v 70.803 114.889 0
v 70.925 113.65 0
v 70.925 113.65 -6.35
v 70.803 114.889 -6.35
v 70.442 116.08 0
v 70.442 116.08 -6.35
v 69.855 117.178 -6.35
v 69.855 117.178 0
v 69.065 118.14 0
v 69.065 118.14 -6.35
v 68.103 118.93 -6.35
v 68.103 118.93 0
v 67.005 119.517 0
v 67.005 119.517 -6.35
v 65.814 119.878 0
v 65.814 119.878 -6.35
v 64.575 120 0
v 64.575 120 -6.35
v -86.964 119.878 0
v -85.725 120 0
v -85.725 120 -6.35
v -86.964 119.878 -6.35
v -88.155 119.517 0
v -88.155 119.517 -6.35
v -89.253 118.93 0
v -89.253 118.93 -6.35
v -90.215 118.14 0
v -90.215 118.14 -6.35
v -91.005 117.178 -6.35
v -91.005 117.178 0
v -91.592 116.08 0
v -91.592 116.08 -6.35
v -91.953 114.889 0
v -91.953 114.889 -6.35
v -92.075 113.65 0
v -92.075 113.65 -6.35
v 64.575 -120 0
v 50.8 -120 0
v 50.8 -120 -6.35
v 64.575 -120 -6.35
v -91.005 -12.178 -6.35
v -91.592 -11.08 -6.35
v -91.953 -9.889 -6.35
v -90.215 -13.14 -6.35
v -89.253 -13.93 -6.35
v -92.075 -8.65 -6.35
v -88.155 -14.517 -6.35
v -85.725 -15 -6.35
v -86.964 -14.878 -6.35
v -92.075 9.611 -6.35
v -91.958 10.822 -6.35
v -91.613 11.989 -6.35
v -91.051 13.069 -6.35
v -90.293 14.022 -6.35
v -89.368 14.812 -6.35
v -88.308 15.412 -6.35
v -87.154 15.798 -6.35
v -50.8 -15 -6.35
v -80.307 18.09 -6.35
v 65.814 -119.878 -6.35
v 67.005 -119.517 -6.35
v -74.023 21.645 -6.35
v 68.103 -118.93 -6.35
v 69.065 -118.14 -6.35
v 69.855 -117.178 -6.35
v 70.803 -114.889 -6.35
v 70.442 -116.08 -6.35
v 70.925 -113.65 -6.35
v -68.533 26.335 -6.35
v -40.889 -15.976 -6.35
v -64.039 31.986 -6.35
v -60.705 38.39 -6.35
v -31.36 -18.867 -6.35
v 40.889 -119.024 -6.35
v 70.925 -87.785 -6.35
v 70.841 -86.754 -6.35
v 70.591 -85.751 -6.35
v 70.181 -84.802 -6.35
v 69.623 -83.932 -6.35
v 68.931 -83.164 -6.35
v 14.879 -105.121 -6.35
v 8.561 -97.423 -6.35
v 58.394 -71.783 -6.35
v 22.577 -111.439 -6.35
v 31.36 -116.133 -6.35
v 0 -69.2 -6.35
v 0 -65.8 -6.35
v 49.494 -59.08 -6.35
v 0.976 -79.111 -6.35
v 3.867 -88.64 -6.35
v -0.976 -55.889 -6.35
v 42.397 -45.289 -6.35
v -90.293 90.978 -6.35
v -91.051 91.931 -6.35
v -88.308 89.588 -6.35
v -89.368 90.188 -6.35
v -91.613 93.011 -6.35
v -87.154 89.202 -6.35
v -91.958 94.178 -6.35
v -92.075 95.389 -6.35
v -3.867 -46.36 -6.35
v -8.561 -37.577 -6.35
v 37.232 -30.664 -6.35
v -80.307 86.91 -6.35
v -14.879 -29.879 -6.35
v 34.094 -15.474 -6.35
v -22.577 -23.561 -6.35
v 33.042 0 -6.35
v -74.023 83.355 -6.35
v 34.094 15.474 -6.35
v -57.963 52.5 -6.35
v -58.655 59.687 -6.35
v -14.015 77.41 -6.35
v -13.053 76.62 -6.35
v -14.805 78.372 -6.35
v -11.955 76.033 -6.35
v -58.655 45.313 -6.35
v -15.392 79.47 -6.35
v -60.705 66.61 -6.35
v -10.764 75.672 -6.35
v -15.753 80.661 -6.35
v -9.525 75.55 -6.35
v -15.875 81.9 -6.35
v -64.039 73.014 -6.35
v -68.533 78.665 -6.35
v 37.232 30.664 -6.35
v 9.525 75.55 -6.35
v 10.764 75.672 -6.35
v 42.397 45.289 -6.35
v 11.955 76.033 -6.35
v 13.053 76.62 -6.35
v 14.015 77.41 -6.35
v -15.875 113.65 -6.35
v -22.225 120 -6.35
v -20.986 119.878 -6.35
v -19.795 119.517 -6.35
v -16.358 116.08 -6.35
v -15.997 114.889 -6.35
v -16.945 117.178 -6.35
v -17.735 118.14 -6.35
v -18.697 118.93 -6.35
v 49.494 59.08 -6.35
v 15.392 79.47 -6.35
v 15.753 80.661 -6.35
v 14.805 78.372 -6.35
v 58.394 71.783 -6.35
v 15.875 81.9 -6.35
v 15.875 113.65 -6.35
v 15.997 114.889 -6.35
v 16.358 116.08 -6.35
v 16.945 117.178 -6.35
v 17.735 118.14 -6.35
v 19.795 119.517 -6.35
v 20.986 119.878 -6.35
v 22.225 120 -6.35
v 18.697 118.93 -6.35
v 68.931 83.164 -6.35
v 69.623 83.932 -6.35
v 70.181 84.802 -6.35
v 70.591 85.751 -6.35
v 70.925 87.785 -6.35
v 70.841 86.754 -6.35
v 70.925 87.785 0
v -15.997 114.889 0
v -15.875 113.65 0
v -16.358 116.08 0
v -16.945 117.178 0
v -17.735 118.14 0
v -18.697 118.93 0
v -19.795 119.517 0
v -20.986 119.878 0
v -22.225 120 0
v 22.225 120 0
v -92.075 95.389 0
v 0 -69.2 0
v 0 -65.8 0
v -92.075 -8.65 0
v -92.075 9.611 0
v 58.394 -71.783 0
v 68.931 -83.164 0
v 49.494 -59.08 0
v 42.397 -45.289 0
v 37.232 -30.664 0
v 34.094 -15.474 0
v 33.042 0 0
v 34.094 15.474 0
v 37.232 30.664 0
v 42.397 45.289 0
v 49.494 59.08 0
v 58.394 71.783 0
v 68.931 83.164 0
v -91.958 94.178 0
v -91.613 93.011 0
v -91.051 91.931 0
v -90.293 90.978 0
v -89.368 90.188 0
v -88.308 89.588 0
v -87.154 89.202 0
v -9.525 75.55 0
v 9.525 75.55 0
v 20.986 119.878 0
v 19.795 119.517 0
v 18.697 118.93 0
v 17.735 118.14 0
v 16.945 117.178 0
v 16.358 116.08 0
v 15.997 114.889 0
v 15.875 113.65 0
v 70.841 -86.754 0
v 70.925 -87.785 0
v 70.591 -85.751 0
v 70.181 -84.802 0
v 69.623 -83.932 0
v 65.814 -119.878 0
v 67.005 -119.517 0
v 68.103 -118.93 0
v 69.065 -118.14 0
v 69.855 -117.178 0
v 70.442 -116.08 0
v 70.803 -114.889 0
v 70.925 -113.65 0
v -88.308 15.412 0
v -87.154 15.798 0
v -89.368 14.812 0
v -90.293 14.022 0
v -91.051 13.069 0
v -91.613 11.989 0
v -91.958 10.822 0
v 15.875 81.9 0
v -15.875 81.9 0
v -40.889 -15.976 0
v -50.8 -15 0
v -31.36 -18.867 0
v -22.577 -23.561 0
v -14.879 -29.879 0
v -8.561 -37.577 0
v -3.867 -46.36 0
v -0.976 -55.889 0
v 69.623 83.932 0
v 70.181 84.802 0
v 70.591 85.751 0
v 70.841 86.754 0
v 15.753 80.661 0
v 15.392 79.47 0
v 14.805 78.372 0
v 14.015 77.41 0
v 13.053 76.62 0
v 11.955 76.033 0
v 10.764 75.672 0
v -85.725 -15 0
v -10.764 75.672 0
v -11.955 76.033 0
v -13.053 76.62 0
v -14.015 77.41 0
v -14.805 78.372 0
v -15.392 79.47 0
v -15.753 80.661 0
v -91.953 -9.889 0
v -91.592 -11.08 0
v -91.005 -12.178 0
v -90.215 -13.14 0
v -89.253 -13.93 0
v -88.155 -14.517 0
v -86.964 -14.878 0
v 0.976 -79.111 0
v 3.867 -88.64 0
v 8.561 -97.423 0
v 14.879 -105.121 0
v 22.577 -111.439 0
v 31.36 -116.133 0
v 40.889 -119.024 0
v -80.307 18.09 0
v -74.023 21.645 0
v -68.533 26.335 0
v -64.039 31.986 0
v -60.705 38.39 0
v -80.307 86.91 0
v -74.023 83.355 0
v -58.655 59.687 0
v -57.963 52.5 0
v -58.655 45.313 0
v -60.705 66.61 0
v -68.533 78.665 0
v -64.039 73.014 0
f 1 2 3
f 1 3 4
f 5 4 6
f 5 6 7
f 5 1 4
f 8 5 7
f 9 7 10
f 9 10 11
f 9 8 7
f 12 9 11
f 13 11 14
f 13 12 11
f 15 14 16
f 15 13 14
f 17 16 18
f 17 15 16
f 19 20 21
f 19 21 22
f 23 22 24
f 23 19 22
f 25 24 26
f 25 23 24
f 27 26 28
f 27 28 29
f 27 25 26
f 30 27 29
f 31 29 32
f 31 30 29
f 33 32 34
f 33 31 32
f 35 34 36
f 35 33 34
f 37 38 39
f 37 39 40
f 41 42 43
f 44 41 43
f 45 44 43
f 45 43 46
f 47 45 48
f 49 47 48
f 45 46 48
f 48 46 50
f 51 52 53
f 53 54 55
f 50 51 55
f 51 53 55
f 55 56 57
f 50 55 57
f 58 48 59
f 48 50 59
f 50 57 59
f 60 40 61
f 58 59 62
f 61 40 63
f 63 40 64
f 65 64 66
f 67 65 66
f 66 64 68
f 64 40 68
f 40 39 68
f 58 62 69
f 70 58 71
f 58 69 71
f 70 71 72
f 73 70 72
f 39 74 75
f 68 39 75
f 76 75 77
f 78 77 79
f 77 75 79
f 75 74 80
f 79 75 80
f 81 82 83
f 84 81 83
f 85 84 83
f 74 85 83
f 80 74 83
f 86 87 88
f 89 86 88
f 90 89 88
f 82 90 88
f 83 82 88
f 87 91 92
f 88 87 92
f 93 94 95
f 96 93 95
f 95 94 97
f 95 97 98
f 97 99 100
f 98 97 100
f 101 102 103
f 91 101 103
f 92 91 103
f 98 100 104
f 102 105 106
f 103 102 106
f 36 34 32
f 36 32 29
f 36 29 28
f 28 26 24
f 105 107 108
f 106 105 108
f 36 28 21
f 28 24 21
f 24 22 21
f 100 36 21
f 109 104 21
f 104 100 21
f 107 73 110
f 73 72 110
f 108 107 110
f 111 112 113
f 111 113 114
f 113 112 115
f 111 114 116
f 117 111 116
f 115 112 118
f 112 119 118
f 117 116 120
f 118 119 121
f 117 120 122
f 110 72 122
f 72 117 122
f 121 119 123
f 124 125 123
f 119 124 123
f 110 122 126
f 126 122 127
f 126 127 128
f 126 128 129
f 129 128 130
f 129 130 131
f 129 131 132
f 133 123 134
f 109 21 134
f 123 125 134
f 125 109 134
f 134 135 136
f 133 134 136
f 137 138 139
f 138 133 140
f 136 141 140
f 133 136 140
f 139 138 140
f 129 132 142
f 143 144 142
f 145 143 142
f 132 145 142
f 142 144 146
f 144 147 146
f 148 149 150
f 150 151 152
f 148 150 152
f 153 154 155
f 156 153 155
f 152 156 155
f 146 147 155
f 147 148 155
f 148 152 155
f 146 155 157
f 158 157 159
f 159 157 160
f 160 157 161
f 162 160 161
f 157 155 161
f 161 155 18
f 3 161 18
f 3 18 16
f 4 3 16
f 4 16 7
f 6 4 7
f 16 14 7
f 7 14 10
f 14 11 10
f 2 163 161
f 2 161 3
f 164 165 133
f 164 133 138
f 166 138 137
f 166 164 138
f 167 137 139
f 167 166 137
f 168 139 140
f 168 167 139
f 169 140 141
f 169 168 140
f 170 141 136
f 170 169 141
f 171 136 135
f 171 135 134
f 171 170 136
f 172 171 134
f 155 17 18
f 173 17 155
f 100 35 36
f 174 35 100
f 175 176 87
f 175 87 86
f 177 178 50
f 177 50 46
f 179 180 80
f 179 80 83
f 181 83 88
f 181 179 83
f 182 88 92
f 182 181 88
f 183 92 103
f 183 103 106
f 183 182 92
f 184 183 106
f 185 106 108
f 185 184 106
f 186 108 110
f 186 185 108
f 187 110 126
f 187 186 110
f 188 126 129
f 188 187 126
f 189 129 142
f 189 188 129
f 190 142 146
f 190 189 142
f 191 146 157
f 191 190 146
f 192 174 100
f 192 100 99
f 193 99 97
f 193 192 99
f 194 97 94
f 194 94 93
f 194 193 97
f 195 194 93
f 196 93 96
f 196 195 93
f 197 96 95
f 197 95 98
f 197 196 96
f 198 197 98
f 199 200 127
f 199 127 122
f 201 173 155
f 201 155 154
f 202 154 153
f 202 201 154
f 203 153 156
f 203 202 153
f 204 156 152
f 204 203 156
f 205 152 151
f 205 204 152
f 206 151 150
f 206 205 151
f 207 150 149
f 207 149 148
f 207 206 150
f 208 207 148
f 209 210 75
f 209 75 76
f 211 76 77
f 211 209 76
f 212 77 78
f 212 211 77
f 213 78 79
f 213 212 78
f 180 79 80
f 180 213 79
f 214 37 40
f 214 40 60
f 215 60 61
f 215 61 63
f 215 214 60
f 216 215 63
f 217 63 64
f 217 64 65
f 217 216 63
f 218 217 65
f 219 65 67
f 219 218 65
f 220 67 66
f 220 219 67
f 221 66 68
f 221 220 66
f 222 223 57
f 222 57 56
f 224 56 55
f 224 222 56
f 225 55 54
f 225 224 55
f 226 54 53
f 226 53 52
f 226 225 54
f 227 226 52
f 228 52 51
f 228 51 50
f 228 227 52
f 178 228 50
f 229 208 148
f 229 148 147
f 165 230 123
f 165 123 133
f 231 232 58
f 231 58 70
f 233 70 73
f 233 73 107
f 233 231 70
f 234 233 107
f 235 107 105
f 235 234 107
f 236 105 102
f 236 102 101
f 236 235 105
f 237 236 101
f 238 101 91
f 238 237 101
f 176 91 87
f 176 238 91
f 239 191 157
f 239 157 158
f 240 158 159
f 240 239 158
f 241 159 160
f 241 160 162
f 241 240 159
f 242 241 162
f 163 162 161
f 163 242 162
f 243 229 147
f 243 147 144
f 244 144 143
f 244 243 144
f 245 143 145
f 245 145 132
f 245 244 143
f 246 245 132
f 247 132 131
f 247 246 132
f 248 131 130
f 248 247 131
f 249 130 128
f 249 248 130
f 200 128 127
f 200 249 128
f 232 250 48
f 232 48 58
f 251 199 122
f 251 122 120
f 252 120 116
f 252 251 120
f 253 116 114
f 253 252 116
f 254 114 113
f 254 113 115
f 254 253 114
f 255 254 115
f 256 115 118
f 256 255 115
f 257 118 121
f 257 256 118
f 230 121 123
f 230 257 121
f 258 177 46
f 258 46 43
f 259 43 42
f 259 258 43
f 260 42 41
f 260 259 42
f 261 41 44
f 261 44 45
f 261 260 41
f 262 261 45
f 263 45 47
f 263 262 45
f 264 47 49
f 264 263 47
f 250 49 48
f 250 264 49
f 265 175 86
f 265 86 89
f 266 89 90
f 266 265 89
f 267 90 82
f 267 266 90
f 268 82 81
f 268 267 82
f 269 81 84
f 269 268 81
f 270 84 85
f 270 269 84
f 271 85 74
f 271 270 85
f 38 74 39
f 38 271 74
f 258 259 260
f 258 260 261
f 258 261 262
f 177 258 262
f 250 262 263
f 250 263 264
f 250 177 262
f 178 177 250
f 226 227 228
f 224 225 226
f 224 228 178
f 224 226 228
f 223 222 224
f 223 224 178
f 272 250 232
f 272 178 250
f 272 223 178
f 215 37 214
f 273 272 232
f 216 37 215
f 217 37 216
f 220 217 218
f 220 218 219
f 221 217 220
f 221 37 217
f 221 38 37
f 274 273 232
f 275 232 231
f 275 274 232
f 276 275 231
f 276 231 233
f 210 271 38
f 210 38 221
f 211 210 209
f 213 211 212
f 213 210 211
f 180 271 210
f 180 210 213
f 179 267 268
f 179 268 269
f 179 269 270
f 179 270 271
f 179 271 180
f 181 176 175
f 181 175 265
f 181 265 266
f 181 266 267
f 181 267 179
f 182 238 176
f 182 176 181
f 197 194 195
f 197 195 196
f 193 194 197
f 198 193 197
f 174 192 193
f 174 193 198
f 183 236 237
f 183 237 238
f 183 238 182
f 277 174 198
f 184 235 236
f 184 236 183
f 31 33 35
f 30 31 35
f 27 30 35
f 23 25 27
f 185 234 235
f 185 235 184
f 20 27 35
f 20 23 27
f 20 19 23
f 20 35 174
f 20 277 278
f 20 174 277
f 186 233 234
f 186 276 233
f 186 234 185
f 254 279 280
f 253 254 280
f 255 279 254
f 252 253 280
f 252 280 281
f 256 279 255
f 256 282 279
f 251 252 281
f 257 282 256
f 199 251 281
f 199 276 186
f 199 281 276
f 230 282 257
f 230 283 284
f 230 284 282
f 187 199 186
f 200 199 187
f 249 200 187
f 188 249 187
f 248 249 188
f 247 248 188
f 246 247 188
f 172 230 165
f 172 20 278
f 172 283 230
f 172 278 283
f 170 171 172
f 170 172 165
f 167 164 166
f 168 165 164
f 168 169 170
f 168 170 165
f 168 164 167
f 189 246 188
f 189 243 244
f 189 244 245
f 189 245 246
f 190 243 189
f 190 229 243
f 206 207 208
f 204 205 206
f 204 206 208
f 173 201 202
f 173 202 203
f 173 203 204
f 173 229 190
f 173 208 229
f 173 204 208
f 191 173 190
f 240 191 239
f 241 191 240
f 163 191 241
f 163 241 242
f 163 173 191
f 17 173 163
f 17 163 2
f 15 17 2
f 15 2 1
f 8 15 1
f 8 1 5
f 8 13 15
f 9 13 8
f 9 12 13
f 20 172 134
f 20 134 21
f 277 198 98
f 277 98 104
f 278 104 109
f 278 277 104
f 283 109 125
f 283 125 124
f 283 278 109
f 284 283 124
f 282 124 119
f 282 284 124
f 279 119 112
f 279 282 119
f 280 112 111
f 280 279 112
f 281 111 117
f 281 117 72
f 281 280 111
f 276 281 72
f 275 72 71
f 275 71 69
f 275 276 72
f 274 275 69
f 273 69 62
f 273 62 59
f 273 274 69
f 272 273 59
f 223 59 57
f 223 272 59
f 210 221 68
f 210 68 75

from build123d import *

# Parameters (mm, degrees)
F1_DEPTH = 6.35


with BuildPart() as f1:
    # F0 (on Top) → F1 (new body)
    with BuildSketch(Plane.XY):
        with BuildLine():
            ThreePointArc((-87.154024, 15.798011), (-90.694749, 13.563629), (-92.075, 9.610896))
            Line((-92.075, 9.610896), (-92.075, -8.65))
            ThreePointArc((-92.075, -8.65), (-90.215128, -13.140128), (-85.725, -15))
            Line((-85.725, -15), (-50.8, -15))
            ThreePointArc((-50.8, -15), (-14.878976, -29.878976), (0, -65.8))
            Line((0, -65.8), (0, -69.2))
            ThreePointArc((0, -69.2), (14.878976, -105.121024), (50.8, -120))
            Line((50.8, -120), (64.575, -120))
            ThreePointArc((64.575, -120), (69.065128, -118.140128), (70.925, -113.65))
            Line((70.925, -113.65), (70.925, -87.784507))
            ThreePointArc((70.925, -87.784507), (70.405264, -85.268454), (68.931135, -83.16427))
            ThreePointArc((68.931135, -83.16427), (33.041556, 0), (68.931135, 83.16427))
            ThreePointArc((68.931135, 83.16427), (70.405264, 85.268454), (70.925, 87.784507))
            Line((70.925, 87.784507), (70.925, 113.65))
            ThreePointArc((70.925, 113.65), (69.065128, 118.140128), (64.575, 120))
            Line((64.575, 120), (22.225, 120))
            ThreePointArc((22.225, 120), (17.734872, 118.140128), (15.875, 113.65))
            Line((15.875, 113.65), (15.875, 81.9))
            ThreePointArc((15.875, 81.9), (14.015128, 77.409872), (9.525, 75.55))
            Line((9.525, 75.55), (-9.525, 75.55))
            ThreePointArc((-9.525, 75.55), (-14.015128, 77.409872), (-15.875, 81.9))
            Line((-15.875, 81.9), (-15.875, 113.65))
            ThreePointArc((-15.875, 113.65), (-17.734872, 118.140128), (-22.225, 120))
            Line((-22.225, 120), (-85.725, 120))
            ThreePointArc((-85.725, 120), (-90.215128, 118.140128), (-92.075, 113.65))
            Line((-92.075, 113.65), (-92.075, 95.389104))
            ThreePointArc((-92.075, 95.389104), (-90.694749, 91.436371), (-87.154024, 89.201989))
            ThreePointArc((-87.154024, 89.201989), (-57.962776, 52.5), (-87.154024, 15.798011))
        make_face()
    extrude(amount=-F1_DEPTH)


solid = f1.part
